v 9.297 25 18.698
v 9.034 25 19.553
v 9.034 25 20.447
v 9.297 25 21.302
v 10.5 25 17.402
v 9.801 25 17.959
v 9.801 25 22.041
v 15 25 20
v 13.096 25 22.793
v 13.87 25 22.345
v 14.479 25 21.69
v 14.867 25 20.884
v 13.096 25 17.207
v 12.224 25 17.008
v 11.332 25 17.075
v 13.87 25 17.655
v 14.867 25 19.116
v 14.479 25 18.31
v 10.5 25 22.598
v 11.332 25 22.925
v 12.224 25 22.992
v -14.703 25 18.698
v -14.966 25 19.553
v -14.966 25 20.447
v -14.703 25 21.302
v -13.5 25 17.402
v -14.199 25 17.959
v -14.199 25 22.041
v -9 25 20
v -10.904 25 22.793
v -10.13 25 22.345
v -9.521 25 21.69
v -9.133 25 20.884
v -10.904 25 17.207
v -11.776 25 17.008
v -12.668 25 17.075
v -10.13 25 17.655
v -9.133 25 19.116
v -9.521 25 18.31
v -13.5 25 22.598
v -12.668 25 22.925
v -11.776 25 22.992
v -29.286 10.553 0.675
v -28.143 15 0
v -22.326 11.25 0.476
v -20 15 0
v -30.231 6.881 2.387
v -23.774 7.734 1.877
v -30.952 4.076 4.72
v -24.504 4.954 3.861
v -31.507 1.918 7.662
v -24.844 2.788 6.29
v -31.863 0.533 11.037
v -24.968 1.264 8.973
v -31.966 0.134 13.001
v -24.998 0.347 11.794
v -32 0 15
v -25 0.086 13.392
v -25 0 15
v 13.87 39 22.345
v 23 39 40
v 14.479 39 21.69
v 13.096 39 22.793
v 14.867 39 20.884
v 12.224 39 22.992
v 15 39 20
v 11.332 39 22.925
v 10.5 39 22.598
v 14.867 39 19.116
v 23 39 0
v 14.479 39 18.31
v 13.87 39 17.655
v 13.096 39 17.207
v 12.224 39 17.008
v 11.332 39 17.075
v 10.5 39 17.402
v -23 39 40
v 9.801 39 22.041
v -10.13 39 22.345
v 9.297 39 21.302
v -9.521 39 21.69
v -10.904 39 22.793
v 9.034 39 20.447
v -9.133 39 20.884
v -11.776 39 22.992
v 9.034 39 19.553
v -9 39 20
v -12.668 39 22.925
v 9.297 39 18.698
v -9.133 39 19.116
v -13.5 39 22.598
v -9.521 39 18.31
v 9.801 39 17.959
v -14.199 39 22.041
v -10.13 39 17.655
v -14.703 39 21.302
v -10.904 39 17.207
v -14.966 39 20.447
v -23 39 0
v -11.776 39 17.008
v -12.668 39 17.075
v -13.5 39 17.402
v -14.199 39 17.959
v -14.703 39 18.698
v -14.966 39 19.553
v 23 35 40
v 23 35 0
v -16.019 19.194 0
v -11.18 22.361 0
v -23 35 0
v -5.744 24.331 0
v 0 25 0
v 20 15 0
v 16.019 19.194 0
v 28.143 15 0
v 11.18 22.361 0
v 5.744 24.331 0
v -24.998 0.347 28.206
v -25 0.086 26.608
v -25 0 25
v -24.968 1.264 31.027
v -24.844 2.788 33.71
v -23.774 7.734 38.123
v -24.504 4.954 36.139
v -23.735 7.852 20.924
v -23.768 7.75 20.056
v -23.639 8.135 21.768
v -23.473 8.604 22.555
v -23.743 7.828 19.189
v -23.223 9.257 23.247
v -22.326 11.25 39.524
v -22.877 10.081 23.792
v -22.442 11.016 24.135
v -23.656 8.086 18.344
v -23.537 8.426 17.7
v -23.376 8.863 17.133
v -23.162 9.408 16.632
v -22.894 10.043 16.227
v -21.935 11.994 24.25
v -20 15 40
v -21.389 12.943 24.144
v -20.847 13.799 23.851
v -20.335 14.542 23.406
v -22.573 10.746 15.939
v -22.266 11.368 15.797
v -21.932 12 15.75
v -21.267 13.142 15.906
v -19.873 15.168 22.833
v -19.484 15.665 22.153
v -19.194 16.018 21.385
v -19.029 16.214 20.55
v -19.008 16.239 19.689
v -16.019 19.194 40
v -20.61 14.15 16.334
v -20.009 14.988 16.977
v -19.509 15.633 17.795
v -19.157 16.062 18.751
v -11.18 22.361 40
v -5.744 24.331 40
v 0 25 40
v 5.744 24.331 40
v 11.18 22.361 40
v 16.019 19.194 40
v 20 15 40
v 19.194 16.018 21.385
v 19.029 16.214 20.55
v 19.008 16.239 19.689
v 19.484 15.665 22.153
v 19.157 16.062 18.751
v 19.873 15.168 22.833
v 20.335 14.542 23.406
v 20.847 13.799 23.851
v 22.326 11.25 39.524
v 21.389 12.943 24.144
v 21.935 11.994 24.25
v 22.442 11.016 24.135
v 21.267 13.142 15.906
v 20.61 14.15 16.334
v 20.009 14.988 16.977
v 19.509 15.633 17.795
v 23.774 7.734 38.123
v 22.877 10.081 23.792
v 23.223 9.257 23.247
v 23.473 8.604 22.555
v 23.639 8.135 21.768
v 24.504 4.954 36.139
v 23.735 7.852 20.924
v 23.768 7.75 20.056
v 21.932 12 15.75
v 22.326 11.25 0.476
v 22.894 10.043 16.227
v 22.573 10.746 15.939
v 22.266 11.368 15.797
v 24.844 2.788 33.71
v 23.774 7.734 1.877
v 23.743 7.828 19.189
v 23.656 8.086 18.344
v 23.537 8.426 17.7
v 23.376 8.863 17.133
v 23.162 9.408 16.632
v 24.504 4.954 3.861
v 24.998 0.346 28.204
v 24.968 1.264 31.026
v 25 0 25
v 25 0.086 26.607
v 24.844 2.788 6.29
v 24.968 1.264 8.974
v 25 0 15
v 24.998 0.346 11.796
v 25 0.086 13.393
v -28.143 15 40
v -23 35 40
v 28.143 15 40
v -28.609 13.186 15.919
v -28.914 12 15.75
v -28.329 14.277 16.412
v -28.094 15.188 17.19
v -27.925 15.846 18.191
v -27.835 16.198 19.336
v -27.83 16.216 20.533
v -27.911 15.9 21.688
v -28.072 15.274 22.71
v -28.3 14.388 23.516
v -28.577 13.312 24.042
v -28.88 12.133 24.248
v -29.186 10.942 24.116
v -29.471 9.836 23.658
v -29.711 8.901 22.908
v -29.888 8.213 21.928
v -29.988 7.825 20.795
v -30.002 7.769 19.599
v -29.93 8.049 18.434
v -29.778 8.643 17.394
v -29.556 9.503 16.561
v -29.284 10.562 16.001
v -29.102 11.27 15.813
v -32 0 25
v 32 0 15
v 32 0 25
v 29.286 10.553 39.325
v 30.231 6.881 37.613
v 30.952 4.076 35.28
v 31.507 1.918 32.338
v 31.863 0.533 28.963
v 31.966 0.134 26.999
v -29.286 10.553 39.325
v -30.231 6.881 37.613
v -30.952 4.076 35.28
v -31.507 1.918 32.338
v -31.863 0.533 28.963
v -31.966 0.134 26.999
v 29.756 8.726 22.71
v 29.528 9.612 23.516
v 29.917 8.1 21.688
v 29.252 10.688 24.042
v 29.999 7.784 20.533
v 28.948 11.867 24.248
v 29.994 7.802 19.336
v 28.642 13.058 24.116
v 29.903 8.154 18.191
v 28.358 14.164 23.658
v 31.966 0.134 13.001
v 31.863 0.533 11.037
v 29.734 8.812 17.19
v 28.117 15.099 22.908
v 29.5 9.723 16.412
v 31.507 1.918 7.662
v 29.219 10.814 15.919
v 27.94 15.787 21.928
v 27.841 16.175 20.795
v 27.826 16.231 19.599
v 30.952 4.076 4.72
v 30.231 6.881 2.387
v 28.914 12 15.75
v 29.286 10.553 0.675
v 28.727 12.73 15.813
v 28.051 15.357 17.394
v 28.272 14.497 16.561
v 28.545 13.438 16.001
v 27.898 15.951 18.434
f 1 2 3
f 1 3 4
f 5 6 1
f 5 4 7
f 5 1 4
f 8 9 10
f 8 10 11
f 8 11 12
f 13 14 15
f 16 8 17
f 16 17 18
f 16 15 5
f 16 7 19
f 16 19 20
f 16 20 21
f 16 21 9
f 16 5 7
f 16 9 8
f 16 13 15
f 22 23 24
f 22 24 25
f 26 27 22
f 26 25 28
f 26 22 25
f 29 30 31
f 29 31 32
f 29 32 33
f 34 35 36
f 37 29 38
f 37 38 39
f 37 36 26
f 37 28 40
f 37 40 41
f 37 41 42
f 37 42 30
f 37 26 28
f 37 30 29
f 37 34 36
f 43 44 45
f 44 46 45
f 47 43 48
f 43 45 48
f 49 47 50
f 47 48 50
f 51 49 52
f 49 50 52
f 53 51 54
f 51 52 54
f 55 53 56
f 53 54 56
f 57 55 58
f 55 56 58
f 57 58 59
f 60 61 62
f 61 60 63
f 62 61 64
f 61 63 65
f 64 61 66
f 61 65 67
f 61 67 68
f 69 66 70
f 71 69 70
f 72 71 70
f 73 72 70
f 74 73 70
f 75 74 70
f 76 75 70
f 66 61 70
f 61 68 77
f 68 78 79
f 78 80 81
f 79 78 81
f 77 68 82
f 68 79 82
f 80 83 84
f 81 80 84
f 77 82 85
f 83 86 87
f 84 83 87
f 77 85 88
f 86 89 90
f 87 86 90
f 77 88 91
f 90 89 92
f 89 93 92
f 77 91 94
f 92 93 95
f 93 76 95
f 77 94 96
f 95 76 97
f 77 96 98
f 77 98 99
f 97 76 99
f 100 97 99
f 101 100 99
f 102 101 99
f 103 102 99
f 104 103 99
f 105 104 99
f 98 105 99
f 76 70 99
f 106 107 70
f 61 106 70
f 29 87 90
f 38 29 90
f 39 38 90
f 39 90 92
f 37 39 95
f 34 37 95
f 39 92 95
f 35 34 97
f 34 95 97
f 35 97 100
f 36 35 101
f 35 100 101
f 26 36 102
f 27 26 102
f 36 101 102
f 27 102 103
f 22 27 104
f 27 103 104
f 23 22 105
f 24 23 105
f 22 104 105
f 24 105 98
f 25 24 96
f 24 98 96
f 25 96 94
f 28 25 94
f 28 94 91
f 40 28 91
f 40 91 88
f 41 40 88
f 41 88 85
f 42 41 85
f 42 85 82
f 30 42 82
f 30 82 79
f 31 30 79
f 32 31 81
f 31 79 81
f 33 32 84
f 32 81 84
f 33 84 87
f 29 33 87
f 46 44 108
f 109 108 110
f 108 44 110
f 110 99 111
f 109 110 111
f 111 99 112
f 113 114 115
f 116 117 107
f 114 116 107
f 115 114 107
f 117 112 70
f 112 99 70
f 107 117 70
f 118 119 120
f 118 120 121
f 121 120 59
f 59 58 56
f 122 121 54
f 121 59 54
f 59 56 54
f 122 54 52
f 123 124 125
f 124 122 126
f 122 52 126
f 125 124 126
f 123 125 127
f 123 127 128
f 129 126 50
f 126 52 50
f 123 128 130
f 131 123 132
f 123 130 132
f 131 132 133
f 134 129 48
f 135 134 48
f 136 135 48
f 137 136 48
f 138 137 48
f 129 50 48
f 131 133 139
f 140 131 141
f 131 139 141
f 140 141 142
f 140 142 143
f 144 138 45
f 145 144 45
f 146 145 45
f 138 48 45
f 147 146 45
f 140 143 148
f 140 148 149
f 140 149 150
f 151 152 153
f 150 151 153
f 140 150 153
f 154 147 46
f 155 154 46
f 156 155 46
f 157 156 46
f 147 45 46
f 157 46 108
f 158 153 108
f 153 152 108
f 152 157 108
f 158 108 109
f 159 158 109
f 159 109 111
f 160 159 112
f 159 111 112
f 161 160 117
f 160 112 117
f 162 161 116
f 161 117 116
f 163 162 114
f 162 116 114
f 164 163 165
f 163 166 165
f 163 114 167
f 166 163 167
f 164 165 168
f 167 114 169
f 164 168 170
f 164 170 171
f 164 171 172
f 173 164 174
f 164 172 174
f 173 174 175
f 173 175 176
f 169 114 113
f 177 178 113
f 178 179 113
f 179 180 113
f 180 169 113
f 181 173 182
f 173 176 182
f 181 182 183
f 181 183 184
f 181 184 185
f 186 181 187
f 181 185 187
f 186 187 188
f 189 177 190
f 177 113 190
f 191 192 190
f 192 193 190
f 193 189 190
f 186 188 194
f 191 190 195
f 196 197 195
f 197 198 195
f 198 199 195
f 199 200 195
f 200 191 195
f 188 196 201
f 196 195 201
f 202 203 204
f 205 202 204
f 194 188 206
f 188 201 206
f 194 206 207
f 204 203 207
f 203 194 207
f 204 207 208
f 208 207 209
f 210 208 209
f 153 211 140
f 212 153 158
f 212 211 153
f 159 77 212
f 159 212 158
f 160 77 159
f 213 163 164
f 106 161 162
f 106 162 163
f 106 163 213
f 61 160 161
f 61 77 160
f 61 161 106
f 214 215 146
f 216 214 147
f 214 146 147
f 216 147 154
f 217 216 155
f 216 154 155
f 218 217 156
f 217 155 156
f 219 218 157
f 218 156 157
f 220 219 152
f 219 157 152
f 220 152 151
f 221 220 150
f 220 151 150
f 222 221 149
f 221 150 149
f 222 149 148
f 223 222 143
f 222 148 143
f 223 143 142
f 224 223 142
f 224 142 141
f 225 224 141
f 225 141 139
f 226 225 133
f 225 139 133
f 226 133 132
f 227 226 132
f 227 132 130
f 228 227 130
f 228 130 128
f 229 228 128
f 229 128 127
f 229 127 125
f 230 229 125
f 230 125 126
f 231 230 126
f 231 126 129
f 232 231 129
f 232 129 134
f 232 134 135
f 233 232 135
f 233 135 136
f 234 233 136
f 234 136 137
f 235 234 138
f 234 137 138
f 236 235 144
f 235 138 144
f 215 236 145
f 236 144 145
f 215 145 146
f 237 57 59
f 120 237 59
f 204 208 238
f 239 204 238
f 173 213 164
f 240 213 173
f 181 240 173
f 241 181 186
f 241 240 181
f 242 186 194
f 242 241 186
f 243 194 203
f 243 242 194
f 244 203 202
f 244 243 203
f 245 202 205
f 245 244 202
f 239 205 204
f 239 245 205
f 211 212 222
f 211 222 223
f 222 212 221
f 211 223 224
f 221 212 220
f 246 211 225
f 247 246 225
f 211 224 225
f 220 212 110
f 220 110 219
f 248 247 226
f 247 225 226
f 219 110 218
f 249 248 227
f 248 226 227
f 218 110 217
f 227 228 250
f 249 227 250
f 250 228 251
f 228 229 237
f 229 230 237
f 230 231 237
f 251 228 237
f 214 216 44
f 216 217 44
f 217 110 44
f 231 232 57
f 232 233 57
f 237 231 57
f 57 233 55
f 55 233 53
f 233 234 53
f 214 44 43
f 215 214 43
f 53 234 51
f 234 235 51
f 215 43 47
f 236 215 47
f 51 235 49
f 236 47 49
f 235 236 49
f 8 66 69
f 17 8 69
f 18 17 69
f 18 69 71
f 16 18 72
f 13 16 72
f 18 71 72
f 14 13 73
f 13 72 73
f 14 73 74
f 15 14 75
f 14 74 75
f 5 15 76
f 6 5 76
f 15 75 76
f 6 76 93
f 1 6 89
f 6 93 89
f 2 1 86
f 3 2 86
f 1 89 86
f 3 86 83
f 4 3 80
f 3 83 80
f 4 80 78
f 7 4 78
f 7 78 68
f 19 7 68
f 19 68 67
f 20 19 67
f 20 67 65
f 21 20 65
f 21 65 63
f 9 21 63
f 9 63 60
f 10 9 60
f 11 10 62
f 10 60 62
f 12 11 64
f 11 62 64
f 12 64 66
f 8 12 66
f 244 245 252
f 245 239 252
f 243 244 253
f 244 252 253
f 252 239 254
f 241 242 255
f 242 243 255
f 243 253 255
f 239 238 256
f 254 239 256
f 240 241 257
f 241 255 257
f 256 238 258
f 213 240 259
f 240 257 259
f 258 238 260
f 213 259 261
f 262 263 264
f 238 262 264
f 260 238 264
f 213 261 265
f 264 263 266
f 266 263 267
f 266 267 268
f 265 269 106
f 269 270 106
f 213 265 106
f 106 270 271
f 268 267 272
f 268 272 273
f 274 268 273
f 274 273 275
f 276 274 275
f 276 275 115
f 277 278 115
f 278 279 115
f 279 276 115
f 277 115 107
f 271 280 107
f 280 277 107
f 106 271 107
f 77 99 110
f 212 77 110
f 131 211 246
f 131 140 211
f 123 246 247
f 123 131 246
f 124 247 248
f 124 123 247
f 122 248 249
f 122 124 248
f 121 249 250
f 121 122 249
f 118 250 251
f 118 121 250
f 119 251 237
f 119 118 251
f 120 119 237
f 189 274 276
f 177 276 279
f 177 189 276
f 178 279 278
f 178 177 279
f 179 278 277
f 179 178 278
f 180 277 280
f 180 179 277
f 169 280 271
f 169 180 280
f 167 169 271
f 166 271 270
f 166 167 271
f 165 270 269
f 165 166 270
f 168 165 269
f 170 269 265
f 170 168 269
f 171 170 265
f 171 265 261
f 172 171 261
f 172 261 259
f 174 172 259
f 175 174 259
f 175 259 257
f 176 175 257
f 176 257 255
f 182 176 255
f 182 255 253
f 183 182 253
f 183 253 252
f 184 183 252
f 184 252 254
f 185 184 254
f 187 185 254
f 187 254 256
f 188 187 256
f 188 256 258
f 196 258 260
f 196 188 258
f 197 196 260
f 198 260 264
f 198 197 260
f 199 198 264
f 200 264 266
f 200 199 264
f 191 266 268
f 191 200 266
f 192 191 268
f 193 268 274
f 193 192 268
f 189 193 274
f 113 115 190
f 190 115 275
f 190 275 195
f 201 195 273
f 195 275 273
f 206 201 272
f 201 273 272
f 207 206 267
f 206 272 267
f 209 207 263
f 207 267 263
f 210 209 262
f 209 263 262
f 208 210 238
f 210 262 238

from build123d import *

# Parameters (mm, degrees)
EXTRUDE_1_DEPTH          = 40
SKETCH_2_R               = 3
CUT_EXTRUDE_1_DEPTH      = 14
SKETCH_3_R               = 4.25
CUT_EXTRUDE_2_DEPTH      = 33
CUT_EXTRUDE_2_DEPTH_BACK = 33
FILLET_1_R               = 15


with BuildPart() as part:
    # 草圖1 → 填料-伸長1 (new body)
    with BuildSketch(Plane.XY):
        with BuildLine():
            Line((-23, 35), (-32, 0))
            Line((-32, 0), (-25, 0))
            ThreePointArc((-25, 0), (0, 25), (25, 0))
            Line((25, 0), (32, 0))
            Line((32, 0), (23, 35))
            Line((23, 35), (23, 39))
            Line((23, 39), (-23, 39))
            Line((-23, 39), (-23, 35))
        make_face()
    extrude(amount=EXTRUDE_1_DEPTH)

    # 草圖2 → 除料-伸長1 (cut)
    with BuildSketch(Plane(origin=(0, 39, 0), x_dir=(1, 0, 0), z_dir=(0, 1, 0))):
        with Locations((-12, -20)):
            Circle(SKETCH_2_R)
        with Locations((12, -20)):
            Circle(SKETCH_2_R)
    extrude(amount=-CUT_EXTRUDE_1_DEPTH, mode=Mode.SUBTRACT)

    # 草圖3 → 除料-伸長2 (cut, two sides)
    with BuildSketch(Plane(origin=(0, 0, 0), x_dir=(0, 0, -1), z_dir=(1, 0, 0))) as cut_extrude_2_sk:
        with Locations((-20, 12)):
            Circle(SKETCH_3_R)
    extrude(amount=CUT_EXTRUDE_2_DEPTH, mode=Mode.SUBTRACT)
    extrude(cut_extrude_2_sk.sketch, amount=-CUT_EXTRUDE_2_DEPTH_BACK, mode=Mode.SUBTRACT)

    # 圓角1
    fillet_1_edges = [part.edges().sort_by_distance(p)[0] for p in [
        (-28.5, 0, 0),
        (-28.5, 0, 40),
        (28.5, 0, 40),
        (28.5, 0, 0),
    ]]
    fillet(fillet_1_edges, radius=FILLET_1_R)


solid = part.part
